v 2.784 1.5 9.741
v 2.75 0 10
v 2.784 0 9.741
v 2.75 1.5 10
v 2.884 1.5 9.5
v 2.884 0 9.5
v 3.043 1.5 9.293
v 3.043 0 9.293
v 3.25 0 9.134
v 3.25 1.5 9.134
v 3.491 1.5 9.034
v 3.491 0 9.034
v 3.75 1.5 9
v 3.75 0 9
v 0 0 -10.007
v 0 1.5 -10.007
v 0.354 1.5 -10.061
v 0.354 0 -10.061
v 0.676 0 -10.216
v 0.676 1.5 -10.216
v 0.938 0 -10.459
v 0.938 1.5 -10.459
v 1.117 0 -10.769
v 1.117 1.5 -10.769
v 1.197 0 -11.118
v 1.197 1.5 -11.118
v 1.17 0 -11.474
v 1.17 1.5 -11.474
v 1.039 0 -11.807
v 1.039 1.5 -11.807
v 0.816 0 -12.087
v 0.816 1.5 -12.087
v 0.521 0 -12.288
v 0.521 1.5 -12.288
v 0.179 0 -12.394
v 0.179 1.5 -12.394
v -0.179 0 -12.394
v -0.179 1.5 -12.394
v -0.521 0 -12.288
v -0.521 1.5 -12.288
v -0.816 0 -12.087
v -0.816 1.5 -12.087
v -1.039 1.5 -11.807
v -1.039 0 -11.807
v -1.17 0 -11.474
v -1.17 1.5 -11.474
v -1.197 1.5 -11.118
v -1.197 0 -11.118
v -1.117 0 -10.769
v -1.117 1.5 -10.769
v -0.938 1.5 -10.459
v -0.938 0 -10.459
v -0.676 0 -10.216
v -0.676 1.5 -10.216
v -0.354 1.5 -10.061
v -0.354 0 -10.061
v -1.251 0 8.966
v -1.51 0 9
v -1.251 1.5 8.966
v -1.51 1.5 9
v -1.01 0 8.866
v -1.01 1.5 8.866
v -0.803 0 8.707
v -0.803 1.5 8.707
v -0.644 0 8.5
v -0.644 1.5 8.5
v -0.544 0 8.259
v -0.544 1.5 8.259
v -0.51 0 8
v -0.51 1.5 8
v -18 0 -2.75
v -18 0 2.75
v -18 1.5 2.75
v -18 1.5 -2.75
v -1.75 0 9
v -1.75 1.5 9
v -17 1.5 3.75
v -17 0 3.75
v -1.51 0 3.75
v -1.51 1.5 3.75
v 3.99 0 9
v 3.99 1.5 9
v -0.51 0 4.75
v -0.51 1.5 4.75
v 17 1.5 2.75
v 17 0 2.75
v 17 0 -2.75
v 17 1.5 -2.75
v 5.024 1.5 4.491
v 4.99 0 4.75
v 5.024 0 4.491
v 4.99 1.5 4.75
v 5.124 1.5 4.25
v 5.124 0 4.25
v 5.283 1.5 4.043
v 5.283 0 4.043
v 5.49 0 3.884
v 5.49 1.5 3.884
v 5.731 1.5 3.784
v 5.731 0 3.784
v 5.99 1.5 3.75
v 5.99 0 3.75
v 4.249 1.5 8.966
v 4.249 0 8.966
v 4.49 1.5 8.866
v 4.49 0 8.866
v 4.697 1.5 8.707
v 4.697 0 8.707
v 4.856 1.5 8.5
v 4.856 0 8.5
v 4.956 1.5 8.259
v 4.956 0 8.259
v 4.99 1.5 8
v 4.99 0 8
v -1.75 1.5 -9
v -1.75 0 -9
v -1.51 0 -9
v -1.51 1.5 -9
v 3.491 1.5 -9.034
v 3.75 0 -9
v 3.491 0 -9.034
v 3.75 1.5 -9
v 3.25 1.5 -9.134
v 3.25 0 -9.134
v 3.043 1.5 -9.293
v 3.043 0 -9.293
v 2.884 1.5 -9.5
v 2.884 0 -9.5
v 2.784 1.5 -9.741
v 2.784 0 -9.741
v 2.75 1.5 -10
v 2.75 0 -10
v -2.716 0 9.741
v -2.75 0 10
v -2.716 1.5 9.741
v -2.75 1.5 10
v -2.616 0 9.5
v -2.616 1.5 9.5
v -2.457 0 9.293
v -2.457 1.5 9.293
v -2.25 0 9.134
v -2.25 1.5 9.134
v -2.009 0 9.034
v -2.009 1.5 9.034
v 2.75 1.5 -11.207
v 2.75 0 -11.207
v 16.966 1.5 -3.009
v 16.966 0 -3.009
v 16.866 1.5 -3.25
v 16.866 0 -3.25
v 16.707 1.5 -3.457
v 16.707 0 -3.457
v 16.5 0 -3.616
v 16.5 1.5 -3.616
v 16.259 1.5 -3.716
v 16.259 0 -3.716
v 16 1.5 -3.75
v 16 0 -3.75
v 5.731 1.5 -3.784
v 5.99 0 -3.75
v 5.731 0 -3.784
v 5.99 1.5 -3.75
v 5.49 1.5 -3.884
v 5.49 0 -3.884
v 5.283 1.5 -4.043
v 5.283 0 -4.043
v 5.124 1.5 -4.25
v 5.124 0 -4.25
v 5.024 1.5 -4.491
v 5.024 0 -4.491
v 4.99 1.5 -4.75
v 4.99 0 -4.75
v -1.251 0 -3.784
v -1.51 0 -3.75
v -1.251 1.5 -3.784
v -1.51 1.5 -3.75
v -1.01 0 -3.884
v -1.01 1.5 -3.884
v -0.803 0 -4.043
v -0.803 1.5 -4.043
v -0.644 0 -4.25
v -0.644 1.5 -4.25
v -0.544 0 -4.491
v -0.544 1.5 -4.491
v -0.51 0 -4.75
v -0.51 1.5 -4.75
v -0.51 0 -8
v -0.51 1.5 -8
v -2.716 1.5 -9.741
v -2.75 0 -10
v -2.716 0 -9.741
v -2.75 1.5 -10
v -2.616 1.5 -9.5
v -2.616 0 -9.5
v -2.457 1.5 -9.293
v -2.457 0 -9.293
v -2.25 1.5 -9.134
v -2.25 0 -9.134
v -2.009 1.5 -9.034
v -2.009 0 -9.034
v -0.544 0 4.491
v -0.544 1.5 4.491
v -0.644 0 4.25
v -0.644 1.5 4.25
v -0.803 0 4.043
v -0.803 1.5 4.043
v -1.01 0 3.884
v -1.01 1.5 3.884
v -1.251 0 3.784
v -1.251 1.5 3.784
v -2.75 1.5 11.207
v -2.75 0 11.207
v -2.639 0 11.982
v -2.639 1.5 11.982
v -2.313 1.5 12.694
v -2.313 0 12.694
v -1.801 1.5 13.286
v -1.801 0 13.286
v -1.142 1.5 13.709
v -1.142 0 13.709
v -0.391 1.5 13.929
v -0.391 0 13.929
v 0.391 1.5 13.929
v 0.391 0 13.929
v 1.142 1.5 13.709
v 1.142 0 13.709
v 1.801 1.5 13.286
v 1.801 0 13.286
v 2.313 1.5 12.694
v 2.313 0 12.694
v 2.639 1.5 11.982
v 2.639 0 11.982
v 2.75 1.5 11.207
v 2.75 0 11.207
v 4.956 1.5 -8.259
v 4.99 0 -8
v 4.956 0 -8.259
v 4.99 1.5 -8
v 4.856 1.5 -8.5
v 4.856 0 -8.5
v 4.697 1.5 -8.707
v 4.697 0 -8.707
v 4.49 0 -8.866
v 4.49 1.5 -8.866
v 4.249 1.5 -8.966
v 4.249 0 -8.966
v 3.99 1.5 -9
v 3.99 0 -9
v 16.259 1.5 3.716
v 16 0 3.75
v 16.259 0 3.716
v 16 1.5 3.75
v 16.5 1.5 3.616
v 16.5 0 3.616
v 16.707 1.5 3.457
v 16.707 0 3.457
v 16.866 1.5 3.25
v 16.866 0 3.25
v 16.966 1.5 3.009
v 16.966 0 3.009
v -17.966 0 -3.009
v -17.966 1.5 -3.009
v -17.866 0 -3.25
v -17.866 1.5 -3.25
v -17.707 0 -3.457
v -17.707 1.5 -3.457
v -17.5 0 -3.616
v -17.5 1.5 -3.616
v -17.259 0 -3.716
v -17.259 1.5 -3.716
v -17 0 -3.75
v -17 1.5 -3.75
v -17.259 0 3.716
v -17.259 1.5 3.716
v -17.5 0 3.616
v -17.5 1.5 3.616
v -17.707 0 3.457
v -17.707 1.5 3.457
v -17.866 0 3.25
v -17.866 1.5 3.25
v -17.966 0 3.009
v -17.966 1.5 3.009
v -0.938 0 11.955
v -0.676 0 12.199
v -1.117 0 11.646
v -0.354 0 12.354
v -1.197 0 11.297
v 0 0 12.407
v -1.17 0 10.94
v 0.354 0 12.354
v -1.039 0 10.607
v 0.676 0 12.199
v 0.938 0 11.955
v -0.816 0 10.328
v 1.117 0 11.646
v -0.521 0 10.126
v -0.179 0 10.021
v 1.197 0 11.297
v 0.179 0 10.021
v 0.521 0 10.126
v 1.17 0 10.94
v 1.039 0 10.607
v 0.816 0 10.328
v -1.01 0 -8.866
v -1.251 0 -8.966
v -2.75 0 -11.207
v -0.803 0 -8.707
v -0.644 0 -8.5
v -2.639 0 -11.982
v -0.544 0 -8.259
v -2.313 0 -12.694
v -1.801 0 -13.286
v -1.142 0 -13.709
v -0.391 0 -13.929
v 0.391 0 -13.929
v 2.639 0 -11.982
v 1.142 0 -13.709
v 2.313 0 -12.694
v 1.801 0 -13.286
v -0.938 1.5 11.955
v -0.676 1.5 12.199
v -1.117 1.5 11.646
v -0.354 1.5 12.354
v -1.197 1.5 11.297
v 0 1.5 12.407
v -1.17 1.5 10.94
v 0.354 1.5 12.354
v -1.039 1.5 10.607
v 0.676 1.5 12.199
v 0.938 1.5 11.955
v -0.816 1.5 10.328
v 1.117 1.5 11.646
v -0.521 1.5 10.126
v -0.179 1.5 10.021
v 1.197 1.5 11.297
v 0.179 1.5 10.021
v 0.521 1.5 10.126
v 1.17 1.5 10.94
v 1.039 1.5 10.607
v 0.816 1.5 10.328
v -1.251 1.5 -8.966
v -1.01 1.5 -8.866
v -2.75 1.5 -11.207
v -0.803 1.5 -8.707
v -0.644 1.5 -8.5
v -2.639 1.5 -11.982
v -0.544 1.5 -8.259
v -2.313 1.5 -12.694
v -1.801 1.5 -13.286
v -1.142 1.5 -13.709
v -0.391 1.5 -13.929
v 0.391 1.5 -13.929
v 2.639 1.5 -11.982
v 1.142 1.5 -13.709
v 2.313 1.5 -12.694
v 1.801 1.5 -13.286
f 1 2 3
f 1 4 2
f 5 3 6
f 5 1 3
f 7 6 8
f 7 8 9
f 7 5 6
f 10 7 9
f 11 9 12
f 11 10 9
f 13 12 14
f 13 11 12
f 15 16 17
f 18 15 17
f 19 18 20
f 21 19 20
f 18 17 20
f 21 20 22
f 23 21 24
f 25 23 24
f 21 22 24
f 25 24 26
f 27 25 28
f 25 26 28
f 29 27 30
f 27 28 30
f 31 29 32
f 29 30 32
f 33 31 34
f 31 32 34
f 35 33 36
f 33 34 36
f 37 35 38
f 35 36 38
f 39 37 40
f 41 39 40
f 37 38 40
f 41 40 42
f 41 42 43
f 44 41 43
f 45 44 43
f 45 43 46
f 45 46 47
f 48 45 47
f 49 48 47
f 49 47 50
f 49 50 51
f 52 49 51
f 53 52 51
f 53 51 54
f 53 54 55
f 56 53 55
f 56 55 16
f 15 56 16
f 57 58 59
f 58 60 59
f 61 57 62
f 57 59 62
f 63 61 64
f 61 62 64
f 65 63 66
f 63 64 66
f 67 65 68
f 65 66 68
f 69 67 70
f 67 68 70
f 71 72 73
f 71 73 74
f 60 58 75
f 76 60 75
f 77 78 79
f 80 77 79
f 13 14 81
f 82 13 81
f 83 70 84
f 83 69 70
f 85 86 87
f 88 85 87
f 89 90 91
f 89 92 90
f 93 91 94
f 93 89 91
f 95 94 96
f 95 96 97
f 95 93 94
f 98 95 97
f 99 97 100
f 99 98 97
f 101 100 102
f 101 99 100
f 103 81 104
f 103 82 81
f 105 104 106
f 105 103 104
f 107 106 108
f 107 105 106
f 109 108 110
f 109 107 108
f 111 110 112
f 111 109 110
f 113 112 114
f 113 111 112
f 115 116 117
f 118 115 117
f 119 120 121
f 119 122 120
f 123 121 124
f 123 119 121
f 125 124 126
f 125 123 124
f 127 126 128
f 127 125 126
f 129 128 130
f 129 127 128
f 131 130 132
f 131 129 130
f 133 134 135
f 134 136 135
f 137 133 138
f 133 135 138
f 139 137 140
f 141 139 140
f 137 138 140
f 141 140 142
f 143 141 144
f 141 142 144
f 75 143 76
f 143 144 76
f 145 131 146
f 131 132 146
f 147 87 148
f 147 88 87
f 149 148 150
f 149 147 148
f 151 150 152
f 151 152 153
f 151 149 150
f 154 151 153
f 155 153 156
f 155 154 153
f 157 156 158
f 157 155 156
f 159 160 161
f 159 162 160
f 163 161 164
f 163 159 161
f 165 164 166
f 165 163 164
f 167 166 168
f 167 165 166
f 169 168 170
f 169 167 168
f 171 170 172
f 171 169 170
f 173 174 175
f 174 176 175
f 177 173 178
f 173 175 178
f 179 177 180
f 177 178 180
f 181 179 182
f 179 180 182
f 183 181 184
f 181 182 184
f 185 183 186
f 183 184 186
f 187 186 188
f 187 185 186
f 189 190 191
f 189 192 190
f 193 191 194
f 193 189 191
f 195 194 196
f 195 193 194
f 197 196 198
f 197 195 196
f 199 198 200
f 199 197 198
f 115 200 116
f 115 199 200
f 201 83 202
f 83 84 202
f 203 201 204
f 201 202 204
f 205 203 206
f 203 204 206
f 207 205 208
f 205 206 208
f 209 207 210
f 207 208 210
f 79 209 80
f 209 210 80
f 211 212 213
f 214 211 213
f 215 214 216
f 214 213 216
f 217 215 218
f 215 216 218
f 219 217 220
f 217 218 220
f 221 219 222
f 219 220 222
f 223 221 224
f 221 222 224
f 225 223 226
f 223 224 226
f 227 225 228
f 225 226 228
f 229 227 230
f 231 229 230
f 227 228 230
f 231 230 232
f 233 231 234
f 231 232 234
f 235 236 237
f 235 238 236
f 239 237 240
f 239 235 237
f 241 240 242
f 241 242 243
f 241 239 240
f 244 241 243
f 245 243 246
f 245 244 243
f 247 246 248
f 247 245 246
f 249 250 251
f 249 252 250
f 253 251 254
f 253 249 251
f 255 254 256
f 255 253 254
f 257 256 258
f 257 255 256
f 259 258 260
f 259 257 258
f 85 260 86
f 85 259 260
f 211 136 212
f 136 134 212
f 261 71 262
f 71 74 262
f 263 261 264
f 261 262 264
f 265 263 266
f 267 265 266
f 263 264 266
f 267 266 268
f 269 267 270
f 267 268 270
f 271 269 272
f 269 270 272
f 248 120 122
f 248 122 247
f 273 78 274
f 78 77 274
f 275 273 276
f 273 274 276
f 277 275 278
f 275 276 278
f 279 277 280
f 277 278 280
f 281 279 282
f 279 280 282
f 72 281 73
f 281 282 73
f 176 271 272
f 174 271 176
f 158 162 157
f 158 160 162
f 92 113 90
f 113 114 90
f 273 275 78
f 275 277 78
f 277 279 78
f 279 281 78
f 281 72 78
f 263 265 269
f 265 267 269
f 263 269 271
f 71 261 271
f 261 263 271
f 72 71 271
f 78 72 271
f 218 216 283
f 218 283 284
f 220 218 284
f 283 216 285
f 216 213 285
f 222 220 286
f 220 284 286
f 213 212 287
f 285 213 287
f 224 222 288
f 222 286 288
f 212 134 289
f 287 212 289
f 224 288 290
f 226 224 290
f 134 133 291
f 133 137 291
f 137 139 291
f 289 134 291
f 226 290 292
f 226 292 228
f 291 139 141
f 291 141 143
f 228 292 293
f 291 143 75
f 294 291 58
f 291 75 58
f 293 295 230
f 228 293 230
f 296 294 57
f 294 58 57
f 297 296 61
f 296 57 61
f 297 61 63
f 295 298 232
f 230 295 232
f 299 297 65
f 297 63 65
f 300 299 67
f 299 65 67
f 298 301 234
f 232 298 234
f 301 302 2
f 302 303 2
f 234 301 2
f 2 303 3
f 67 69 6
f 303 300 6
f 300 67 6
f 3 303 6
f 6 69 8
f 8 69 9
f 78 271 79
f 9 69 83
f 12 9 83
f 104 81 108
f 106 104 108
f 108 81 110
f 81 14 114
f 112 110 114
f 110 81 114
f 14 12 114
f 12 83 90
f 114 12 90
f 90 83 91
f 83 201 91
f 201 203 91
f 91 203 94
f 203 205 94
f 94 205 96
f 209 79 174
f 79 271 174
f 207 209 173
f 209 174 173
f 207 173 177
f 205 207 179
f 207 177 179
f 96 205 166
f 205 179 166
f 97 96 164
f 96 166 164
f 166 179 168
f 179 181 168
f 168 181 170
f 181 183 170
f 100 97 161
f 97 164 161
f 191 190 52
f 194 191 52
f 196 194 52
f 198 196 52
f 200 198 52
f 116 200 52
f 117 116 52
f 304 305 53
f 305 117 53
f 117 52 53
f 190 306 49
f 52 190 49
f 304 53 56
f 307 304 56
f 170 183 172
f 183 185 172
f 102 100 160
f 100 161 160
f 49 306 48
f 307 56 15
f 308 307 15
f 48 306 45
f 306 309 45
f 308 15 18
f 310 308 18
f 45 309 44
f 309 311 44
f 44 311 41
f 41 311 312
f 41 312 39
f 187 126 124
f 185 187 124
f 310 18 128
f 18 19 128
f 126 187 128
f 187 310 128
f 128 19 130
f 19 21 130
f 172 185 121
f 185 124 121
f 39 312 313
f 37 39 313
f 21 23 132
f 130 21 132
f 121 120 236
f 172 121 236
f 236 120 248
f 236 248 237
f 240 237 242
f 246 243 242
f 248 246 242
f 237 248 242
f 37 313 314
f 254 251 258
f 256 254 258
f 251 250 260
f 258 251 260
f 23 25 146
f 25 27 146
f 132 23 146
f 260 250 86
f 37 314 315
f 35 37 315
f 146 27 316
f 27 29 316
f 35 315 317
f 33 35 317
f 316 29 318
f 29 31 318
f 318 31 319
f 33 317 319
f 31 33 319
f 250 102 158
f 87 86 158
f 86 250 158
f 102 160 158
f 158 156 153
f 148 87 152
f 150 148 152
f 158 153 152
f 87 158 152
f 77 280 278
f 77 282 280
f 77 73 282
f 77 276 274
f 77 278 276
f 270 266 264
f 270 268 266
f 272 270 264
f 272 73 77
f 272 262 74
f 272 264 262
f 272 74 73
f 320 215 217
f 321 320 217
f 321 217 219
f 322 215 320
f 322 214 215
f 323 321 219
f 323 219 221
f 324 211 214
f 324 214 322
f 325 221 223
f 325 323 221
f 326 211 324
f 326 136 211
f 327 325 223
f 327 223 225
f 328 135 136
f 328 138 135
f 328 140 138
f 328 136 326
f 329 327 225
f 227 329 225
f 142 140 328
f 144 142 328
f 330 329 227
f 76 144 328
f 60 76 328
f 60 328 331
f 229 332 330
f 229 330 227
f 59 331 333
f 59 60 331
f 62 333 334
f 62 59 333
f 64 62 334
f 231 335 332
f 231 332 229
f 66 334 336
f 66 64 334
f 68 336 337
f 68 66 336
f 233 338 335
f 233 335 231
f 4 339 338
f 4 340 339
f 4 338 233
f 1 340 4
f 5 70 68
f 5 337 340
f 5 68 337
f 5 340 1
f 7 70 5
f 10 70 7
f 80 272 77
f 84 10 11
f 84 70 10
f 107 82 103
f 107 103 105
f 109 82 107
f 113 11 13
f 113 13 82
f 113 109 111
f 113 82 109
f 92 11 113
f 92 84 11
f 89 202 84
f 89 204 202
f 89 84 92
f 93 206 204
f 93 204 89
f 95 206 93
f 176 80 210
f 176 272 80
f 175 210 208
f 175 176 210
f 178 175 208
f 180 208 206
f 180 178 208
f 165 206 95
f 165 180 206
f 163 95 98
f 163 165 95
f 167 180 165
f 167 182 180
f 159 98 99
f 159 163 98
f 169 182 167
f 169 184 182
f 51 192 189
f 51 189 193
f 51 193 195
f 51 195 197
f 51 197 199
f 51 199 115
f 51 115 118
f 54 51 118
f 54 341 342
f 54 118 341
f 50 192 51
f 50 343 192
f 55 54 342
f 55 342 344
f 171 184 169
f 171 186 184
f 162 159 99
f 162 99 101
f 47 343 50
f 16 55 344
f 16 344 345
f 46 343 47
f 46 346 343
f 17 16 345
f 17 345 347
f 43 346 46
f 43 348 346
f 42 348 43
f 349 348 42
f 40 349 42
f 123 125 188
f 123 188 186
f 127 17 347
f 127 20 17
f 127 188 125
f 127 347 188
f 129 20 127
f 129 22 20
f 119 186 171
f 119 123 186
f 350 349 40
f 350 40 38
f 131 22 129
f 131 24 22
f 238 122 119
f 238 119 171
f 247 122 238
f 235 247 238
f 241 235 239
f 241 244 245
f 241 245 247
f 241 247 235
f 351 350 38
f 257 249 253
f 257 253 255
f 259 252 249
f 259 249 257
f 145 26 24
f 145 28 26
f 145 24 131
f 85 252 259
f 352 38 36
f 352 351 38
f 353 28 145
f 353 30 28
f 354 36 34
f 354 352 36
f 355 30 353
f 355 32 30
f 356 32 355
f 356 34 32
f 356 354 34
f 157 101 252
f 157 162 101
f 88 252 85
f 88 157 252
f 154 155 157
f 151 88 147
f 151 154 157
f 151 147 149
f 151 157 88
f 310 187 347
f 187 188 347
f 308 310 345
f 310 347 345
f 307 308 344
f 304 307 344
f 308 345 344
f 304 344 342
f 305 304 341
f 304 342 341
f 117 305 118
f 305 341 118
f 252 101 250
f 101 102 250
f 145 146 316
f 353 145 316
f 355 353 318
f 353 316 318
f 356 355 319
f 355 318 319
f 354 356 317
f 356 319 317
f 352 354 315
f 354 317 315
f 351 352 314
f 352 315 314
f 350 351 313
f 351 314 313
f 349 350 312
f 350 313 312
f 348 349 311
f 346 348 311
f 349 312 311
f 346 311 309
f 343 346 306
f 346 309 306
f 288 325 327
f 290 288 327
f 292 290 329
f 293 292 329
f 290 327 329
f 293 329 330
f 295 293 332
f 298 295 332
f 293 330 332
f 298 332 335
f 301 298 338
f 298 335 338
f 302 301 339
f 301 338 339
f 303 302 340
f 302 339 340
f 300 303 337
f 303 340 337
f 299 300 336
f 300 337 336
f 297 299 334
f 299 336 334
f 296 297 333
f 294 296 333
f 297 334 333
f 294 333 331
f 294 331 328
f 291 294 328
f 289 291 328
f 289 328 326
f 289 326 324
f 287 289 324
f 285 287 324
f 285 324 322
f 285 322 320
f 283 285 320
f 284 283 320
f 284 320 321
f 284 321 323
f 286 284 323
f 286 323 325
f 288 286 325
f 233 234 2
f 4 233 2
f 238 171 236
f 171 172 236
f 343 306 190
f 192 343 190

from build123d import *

# Parameters (mm, degrees)
SKETCH1_W            = 13.25
SKETCH1_H            = 7.5
SKETCH1_W_2          = 2
SKETCH1_W_3          = 2.24
SKETCH1_W_4          = 3.26
SKETCH1_W_5          = 8.01
SKETCH1_H_2          = 3.25
SKETCH1_H_3          = 2
SKETCH1_R            = 1.25
BOSS_EXTRUDE1_DEPTH  = 1.5
M2_CLEARANCE_HOLE1_D = 2.4
FILLET1_R            = 1


with BuildPart() as part:
    # Sketch1 → Boss-Extrude1 (new body)
    # profile 1 of 22: a face of its own
    with BuildSketch(Plane(origin=(0, 0, 0), x_dir=(1, 0, 0), z_dir=(0, 1, 0))):
        with Locations((-9.375, 0)):
            Rectangle(SKETCH1_W, SKETCH1_H)
    # profile 2 of 22: a face of its own
    with BuildSketch(Plane(origin=(0, 0, 0), x_dir=(1, 0, 0), z_dir=(0, 1, 0))):
        with Locations((-17, 0)):
            Rectangle(SKETCH1_W_2, SKETCH1_H)
    # profile 3 of 22: a face of its own
    with BuildSketch(Plane(origin=(0, 0, 0), x_dir=(1, 0, 0), z_dir=(0, 1, 0))):
        with Locations((-1.63, 0)):
            Rectangle(SKETCH1_W_3, SKETCH1_H)
    # profile 4 of 22: a face of its own
    with BuildSketch(Plane(origin=(0, 0, 0), x_dir=(1, 0, 0), z_dir=(0, 1, 0))):
        with Locations((1.12, 0)):
            Rectangle(SKETCH1_W_4, SKETCH1_H)
    # profile 5 of 22: a face of its own
    with BuildSketch(Plane(origin=(0, 0, 0), x_dir=(1, 0, 0), z_dir=(0, 1, 0))):
        with Locations((3.87, 0)):
            Rectangle(SKETCH1_W_3, SKETCH1_H)
    # profile 6 of 22: a face of its own
    with BuildSketch(Plane(origin=(0, 0, 0), x_dir=(1, 0, 0), z_dir=(0, 1, 0))):
        with Locations((8.995, 0)):
            Rectangle(SKETCH1_W_5, SKETCH1_H)
    # profile 7 of 22: a face of its own
    with BuildSketch(Plane(origin=(0, 0, 0), x_dir=(1, 0, 0), z_dir=(0, 1, 0))):
        with Locations((14, 0)):
            Rectangle(SKETCH1_W_2, SKETCH1_H)
    # profile 8 of 22: a face of its own
    with BuildSketch(Plane(origin=(0, 0, 0), x_dir=(1, 0, 0), z_dir=(0, 1, 0))):
        with Locations((16, 0)):
            Rectangle(SKETCH1_W_2, SKETCH1_H)
    # profile 9 of 22: a face of its own
    with BuildSketch(Plane(origin=(0, 0, 0), x_dir=(1, 0, 0), z_dir=(0, 1, 0))):
        with Locations((3.87, 5.375)):
            Rectangle(SKETCH1_W_3, SKETCH1_H_2)
    # profile 10 of 22: a face of its own
    with BuildSketch(Plane(origin=(0, 0, 0), x_dir=(1, 0, 0), z_dir=(0, 1, 0))):
        with Locations((3.87, -5.375)):
            Rectangle(SKETCH1_W_3, SKETCH1_H_2)
    # profile 11 of 22: a face of its own
    with BuildSketch(Plane(origin=(0, 0, 0), x_dir=(1, 0, 0), z_dir=(0, 1, 0))):
        with Locations((3.87, -8)):
            Rectangle(SKETCH1_W_3, SKETCH1_H_3)
    # profile 12 of 22: a face of its own
    with BuildSketch(Plane(origin=(0, 0, 0), x_dir=(1, 0, 0), z_dir=(0, 1, 0))):
        with Locations((1.12, -8)):
            Rectangle(SKETCH1_W_4, SKETCH1_H_3)
    # profile 13 of 22: a face of its own
    with BuildSketch(Plane(origin=(0, 0, 0), x_dir=(1, 0, 0), z_dir=(0, 1, 0))):
        with Locations((1.12, -5.375)):
            Rectangle(SKETCH1_W_4, SKETCH1_H_2)
    # profile 14 of 22: a face of its own
    with BuildSketch(Plane(origin=(0, 0, 0), x_dir=(1, 0, 0), z_dir=(0, 1, 0))):
        with Locations((1.12, 5.375)):
            Rectangle(SKETCH1_W_4, SKETCH1_H_2)
    # profile 15 of 22: a face of its own
    with BuildSketch(Plane(origin=(0, 0, 0), x_dir=(1, 0, 0), z_dir=(0, 1, 0))):
        with Locations((1.12, 8)):
            Rectangle(SKETCH1_W_4, SKETCH1_H_3)
    # profile 16 of 22: a face of its own
    with BuildSketch(Plane(origin=(0, 0, 0), x_dir=(1, 0, 0), z_dir=(0, 1, 0))):
        with Locations((3.87, 8)):
            Rectangle(SKETCH1_W_3, SKETCH1_H_3)
    # profile 17 of 22: a face of its own
    with BuildSketch(Plane(origin=(0, 0, 0), x_dir=(1, 0, 0), z_dir=(0, 1, 0))):
        with BuildLine():
            Line((2.75, 9.125), (2.75, 11.2072))
            ThreePointArc((2.75, 11.2072), (0, 13.9572), (-2.75, 11.2072))
            Line((-2.75, 11.2072), (-2.75, 9.125))
            Line((-2.75, 9.125), (2.75, 9.125))
        make_face()
        with Locations((0, 11.2072)):
            Circle(SKETCH1_R, mode=Mode.SUBTRACT)
    # profile 18 of 22: a face of its own
    with BuildSketch(Plane(origin=(0, 0, 0), x_dir=(1, 0, 0), z_dir=(0, 1, 0))):
        with BuildLine():
            Line((2.75, -11.2072), (2.75, -9.125))
            Line((2.75, -9.125), (-2.75, -9.125))
            Line((-2.75, -9.125), (-2.75, -11.2072))
            ThreePointArc((-2.75, -11.2072), (0, -13.9572), (2.75, -11.2072))
        make_face()
        with Locations((0, -11.2072)):
            Circle(SKETCH1_R, mode=Mode.SUBTRACT)
    # profile 19 of 22: a face of its own
    with BuildSketch(Plane(origin=(0, 0, 0), x_dir=(1, 0, 0), z_dir=(0, 1, 0))):
        Polygon((2.75, 9), (2.75, 9.125), (-2.75, 9.125), (-2.75, 9), (-0.51, 9), align=None)
    # profile 20 of 22: a face of its own
    with BuildSketch(Plane(origin=(0, 0, 0), x_dir=(1, 0, 0), z_dir=(0, 1, 0))):
        with Locations((0, 11.2072)):
            Circle(SKETCH1_R)
    # profile 21 of 22: a face of its own
    with BuildSketch(Plane(origin=(0, 0, 0), x_dir=(1, 0, 0), z_dir=(0, 1, 0))):
        with Locations((0, -11.2072)):
            Circle(SKETCH1_R)
    # profile 22 of 22: a face of its own
    with BuildSketch(Plane(origin=(0, 0, 0), x_dir=(1, 0, 0), z_dir=(0, 1, 0))):
        Polygon((2.75, -9.125), (2.75, -9), (-0.51, -9), (-2.75, -9), (-2.75, -9.125), align=None)
    extrude(amount=BOSS_EXTRUDE1_DEPTH)

    # M2 Clearance Hole1 (through all)
    with Locations(Plane(origin=(0, 0, -11.2072), x_dir=(0, 0, -1), z_dir=(0, -1, 0))):
        with Locations((0, 0), (-22.4144, 0)):
            Hole(M2_CLEARANCE_HOLE1_D / 2)

    # Fillet1
    fillet1_edges = [part.edges().sort_by_distance(p)[0] for p in [
        (-0.51, 0.75, 3.75),
        (-18, 0.75, 3.75),
        (-18, 0.75, -3.75),
        (-0.51, 0.75, -3.75),
        (-0.51, 0.75, -9),
        (-2.75, 0.75, -9),
        (2.75, 0.75, -9),
        (4.99, 0.75, -9),
        (4.99, 0.75, -3.75),
        (17, 0.75, -3.75),
        (17, 0.75, 3.75),
        (4.99, 0.75, 3.75),
        (4.99, 0.75, 9),
        (2.75, 0.75, 9),
        (-2.75, 0.75, 9),
        (-0.51, 0.75, 9),
    ]]
    fillet(fillet1_edges, radius=FILLET1_R)


solid = part.part
